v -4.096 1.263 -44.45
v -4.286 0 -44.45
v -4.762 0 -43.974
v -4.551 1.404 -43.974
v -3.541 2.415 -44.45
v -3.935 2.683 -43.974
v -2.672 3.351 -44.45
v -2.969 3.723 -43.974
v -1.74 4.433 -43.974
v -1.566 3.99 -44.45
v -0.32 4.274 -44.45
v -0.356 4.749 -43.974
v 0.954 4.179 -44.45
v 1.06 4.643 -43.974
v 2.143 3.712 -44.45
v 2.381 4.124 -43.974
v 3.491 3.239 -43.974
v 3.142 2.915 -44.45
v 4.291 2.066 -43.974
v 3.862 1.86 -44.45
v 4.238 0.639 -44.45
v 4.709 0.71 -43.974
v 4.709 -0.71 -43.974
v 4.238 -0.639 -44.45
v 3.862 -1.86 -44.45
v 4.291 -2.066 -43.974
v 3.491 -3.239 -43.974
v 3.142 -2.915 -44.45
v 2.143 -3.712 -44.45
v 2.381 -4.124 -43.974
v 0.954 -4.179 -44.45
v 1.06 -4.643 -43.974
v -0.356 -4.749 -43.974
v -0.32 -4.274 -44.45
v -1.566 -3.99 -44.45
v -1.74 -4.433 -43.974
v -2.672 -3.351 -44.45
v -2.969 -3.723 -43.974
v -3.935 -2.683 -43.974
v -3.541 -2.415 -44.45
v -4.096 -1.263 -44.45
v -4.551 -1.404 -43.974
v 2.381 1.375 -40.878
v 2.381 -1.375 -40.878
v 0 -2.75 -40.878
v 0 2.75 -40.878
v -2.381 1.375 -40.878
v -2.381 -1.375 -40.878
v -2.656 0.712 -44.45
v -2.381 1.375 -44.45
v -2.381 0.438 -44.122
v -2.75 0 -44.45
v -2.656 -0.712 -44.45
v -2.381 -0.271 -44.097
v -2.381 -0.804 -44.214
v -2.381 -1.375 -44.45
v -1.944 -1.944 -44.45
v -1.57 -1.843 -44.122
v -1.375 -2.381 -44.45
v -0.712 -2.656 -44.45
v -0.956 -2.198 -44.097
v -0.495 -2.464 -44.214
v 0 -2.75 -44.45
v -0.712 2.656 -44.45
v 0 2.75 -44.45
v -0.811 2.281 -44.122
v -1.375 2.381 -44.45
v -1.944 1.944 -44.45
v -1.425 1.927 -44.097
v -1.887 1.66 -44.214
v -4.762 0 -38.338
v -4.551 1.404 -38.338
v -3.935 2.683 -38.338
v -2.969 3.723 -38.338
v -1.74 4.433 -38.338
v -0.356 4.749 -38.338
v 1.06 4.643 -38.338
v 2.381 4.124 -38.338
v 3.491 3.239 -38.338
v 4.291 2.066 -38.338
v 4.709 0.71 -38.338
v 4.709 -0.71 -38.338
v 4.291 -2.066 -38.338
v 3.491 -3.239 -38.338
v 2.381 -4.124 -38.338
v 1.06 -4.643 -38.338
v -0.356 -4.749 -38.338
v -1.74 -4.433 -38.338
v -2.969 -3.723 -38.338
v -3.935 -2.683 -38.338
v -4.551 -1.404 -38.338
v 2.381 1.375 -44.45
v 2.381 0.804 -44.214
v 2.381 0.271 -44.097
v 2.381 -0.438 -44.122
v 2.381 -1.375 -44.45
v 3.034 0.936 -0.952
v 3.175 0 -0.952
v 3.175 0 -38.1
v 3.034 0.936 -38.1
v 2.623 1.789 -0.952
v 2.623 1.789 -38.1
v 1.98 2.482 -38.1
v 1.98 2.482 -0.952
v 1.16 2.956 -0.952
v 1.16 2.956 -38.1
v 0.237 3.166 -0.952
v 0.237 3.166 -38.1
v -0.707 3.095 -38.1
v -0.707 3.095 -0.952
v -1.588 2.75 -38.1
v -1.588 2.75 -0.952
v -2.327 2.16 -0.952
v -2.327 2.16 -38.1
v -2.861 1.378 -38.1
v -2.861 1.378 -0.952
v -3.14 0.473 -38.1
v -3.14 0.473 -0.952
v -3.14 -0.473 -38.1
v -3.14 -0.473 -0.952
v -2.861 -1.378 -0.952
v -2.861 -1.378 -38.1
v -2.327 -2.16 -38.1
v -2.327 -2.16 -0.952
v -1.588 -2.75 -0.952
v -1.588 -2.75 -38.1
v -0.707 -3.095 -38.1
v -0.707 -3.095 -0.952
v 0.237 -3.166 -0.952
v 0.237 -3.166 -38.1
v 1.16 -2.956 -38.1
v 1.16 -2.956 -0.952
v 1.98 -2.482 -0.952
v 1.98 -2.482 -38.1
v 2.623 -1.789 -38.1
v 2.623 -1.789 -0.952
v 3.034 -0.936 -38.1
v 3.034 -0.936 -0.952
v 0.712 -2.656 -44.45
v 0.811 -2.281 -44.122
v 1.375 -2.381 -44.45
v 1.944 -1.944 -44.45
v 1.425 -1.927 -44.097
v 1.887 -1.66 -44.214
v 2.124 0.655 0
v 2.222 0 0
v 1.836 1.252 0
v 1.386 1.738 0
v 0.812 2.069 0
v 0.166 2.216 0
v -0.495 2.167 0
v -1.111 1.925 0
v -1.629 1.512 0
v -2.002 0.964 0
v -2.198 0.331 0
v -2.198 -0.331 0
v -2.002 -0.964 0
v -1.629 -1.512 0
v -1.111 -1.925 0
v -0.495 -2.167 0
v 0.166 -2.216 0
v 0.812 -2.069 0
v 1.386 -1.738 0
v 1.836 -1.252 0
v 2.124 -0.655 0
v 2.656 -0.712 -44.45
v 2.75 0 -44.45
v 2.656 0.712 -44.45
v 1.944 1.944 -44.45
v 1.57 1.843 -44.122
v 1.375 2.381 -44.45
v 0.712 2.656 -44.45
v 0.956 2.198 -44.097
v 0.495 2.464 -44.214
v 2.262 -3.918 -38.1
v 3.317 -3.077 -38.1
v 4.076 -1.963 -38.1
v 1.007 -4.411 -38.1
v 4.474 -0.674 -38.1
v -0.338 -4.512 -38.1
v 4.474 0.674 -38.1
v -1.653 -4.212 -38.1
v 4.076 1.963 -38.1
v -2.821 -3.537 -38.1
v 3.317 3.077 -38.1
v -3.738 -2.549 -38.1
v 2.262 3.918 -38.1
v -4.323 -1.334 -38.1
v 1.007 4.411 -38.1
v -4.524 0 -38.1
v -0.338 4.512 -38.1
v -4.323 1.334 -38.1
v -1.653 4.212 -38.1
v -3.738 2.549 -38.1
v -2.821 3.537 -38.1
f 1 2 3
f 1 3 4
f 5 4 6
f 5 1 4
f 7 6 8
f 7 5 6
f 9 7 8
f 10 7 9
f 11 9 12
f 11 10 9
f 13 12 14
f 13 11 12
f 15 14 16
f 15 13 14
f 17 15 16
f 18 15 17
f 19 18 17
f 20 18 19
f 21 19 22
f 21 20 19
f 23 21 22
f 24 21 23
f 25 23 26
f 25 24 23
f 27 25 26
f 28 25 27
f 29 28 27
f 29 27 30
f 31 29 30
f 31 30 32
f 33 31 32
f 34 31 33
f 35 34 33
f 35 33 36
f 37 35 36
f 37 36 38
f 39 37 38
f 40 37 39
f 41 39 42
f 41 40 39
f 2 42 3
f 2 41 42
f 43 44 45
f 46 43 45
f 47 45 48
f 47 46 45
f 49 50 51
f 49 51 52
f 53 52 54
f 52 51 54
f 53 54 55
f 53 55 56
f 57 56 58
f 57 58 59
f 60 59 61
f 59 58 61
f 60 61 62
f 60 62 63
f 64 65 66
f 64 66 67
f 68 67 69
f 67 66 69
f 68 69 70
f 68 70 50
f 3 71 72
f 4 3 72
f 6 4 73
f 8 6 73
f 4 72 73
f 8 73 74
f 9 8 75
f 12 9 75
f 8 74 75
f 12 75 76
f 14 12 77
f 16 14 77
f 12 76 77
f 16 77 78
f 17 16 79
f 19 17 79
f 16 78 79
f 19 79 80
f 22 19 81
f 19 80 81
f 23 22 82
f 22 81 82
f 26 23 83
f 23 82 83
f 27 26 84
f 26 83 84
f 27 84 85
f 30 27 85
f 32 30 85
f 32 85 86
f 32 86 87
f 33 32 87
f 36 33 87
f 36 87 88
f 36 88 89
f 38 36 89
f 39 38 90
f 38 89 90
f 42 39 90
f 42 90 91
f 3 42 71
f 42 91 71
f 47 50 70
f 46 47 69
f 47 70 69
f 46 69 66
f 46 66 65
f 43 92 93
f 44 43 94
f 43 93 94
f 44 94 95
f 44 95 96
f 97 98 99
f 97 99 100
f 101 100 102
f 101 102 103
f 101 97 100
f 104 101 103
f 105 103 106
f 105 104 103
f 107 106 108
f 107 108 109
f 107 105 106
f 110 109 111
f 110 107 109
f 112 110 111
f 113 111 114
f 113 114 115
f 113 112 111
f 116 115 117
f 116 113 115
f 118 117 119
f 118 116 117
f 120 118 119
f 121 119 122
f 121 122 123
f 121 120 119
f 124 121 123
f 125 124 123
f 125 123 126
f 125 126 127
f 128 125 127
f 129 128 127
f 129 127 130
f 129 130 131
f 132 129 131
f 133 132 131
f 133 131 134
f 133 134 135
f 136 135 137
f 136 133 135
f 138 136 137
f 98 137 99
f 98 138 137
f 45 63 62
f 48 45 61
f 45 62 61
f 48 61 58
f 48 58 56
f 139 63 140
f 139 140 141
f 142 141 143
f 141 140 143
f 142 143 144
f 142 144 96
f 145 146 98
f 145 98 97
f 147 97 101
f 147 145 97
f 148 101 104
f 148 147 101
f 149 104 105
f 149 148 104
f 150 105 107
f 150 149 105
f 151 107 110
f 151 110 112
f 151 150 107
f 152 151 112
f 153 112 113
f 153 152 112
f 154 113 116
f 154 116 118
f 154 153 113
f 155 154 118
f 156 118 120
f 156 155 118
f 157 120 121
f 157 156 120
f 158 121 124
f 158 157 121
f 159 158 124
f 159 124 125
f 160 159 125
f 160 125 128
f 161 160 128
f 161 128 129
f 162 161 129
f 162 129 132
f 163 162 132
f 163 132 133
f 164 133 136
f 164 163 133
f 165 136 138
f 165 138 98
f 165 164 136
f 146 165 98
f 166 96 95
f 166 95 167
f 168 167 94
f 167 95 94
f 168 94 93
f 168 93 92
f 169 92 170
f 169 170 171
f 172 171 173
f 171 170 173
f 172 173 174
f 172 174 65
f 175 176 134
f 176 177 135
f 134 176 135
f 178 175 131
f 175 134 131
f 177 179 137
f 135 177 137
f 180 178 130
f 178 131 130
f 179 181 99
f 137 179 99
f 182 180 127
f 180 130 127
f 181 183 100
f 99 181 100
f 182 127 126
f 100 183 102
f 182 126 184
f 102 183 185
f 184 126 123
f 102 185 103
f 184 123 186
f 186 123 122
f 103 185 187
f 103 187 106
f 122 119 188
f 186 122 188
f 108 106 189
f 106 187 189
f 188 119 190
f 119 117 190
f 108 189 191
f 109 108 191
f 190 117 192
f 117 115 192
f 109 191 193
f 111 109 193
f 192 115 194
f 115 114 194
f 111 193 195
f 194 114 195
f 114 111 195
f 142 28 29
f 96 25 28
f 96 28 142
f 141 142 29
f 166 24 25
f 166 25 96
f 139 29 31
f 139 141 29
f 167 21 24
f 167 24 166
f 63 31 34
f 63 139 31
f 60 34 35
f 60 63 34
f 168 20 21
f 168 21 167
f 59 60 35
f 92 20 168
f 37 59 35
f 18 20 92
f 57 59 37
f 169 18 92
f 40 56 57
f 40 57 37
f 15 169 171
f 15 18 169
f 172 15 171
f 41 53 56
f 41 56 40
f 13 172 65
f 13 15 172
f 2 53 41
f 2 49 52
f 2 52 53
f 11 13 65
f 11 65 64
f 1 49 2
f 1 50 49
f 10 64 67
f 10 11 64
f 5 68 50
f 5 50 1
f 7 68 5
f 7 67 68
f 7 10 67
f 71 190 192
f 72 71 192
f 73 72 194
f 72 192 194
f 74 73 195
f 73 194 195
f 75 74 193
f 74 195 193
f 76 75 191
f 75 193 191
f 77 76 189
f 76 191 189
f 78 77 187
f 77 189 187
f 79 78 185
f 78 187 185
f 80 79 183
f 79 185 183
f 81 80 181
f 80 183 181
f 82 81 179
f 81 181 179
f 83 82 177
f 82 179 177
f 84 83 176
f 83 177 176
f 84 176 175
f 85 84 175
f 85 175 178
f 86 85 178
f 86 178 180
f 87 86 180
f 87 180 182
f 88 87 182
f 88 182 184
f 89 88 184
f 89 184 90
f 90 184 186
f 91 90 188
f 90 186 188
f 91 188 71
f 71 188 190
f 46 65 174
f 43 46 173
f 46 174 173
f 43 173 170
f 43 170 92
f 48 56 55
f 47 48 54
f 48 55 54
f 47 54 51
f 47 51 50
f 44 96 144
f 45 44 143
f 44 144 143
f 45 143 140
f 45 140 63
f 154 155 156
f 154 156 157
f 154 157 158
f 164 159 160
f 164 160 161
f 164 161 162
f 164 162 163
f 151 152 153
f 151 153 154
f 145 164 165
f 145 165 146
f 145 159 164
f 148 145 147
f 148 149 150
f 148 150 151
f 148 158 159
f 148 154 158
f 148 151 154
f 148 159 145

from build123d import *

# Parameters (mm, degrees)
SKETCH1_R          = 3.175
EXTRUDE1_DEPTH     = 38.1
CHAMFER3_SIZE      = 0.9525
SKETCH6_R          = 4.7625
EXTRUDE2_DEPTH     = 6.35
CUT_EXTRUDE1_DEPTH = 3.571875
CHAMFER1_SIZE      = 0.47625
CHAMFER2_SIZE      = 0.238125


with BuildPart() as part:
    # Sketch1 → Extrude1 (new body)
    with BuildSketch(Plane.XY):
        Circle(SKETCH1_R)
    extrude(amount=-EXTRUDE1_DEPTH)

    # Chamfer3
    chamfer3_edges = [part.edges().sort_by_distance(p)[0] for p in [
        (-3.175, 0, 0),
    ]]
    chamfer(chamfer3_edges, length=CHAMFER3_SIZE)

    # Sketch6 → Extrude2 (add)
    with BuildSketch(Plane(origin=(0, 0, -38.1), x_dir=(-1, 0, 0), z_dir=(0, 0, -1))):
        Circle(SKETCH6_R)
    extrude(amount=EXTRUDE2_DEPTH)

    # Sketch7 → Cut-Extrude1 (cut)
    with BuildSketch(Plane(origin=(0, 0, -44.45), x_dir=(-1, 0, 0), z_dir=(0, 0, -1))):
        Polygon((0, 2.749630657), (-2.38125, 1.374815329), (-2.38125, -1.374815329), (0, -2.749630657), (2.38125, -1.374815329), (2.38125, 1.374815329), align=None)
    extrude(amount=-CUT_EXTRUDE1_DEPTH, mode=Mode.SUBTRACT)

    # Cut-Extrude2 cone 1 section (through the dimple's axis) → Cut-Extrude2 (revolve, cut)
    with BuildSketch(Plane(origin=(0, 0, -44.45), x_dir=(0, 1, 0), z_dir=(1, 0, 0))):
        Polygon((0, 0), (2.749630657, 0), (0, 2.749630657), align=None)
    revolve(axis=Axis((0, 0, -44.45), (0, 0, 1)), mode=Mode.SUBTRACT)

    # Chamfer1
    chamfer1_edges = [part.edges().sort_by_distance(p)[0] for p in [
        (4.7625, 0, -44.45),
    ]]
    chamfer(chamfer1_edges, length=CHAMFER1_SIZE)

    # Chamfer2
    chamfer2_edges = [part.edges().sort_by_distance(p)[0] for p in [
        (4.7625, 0, -38.1),
    ]]
    chamfer(chamfer2_edges, length=CHAMFER2_SIZE)


solid = part.part
